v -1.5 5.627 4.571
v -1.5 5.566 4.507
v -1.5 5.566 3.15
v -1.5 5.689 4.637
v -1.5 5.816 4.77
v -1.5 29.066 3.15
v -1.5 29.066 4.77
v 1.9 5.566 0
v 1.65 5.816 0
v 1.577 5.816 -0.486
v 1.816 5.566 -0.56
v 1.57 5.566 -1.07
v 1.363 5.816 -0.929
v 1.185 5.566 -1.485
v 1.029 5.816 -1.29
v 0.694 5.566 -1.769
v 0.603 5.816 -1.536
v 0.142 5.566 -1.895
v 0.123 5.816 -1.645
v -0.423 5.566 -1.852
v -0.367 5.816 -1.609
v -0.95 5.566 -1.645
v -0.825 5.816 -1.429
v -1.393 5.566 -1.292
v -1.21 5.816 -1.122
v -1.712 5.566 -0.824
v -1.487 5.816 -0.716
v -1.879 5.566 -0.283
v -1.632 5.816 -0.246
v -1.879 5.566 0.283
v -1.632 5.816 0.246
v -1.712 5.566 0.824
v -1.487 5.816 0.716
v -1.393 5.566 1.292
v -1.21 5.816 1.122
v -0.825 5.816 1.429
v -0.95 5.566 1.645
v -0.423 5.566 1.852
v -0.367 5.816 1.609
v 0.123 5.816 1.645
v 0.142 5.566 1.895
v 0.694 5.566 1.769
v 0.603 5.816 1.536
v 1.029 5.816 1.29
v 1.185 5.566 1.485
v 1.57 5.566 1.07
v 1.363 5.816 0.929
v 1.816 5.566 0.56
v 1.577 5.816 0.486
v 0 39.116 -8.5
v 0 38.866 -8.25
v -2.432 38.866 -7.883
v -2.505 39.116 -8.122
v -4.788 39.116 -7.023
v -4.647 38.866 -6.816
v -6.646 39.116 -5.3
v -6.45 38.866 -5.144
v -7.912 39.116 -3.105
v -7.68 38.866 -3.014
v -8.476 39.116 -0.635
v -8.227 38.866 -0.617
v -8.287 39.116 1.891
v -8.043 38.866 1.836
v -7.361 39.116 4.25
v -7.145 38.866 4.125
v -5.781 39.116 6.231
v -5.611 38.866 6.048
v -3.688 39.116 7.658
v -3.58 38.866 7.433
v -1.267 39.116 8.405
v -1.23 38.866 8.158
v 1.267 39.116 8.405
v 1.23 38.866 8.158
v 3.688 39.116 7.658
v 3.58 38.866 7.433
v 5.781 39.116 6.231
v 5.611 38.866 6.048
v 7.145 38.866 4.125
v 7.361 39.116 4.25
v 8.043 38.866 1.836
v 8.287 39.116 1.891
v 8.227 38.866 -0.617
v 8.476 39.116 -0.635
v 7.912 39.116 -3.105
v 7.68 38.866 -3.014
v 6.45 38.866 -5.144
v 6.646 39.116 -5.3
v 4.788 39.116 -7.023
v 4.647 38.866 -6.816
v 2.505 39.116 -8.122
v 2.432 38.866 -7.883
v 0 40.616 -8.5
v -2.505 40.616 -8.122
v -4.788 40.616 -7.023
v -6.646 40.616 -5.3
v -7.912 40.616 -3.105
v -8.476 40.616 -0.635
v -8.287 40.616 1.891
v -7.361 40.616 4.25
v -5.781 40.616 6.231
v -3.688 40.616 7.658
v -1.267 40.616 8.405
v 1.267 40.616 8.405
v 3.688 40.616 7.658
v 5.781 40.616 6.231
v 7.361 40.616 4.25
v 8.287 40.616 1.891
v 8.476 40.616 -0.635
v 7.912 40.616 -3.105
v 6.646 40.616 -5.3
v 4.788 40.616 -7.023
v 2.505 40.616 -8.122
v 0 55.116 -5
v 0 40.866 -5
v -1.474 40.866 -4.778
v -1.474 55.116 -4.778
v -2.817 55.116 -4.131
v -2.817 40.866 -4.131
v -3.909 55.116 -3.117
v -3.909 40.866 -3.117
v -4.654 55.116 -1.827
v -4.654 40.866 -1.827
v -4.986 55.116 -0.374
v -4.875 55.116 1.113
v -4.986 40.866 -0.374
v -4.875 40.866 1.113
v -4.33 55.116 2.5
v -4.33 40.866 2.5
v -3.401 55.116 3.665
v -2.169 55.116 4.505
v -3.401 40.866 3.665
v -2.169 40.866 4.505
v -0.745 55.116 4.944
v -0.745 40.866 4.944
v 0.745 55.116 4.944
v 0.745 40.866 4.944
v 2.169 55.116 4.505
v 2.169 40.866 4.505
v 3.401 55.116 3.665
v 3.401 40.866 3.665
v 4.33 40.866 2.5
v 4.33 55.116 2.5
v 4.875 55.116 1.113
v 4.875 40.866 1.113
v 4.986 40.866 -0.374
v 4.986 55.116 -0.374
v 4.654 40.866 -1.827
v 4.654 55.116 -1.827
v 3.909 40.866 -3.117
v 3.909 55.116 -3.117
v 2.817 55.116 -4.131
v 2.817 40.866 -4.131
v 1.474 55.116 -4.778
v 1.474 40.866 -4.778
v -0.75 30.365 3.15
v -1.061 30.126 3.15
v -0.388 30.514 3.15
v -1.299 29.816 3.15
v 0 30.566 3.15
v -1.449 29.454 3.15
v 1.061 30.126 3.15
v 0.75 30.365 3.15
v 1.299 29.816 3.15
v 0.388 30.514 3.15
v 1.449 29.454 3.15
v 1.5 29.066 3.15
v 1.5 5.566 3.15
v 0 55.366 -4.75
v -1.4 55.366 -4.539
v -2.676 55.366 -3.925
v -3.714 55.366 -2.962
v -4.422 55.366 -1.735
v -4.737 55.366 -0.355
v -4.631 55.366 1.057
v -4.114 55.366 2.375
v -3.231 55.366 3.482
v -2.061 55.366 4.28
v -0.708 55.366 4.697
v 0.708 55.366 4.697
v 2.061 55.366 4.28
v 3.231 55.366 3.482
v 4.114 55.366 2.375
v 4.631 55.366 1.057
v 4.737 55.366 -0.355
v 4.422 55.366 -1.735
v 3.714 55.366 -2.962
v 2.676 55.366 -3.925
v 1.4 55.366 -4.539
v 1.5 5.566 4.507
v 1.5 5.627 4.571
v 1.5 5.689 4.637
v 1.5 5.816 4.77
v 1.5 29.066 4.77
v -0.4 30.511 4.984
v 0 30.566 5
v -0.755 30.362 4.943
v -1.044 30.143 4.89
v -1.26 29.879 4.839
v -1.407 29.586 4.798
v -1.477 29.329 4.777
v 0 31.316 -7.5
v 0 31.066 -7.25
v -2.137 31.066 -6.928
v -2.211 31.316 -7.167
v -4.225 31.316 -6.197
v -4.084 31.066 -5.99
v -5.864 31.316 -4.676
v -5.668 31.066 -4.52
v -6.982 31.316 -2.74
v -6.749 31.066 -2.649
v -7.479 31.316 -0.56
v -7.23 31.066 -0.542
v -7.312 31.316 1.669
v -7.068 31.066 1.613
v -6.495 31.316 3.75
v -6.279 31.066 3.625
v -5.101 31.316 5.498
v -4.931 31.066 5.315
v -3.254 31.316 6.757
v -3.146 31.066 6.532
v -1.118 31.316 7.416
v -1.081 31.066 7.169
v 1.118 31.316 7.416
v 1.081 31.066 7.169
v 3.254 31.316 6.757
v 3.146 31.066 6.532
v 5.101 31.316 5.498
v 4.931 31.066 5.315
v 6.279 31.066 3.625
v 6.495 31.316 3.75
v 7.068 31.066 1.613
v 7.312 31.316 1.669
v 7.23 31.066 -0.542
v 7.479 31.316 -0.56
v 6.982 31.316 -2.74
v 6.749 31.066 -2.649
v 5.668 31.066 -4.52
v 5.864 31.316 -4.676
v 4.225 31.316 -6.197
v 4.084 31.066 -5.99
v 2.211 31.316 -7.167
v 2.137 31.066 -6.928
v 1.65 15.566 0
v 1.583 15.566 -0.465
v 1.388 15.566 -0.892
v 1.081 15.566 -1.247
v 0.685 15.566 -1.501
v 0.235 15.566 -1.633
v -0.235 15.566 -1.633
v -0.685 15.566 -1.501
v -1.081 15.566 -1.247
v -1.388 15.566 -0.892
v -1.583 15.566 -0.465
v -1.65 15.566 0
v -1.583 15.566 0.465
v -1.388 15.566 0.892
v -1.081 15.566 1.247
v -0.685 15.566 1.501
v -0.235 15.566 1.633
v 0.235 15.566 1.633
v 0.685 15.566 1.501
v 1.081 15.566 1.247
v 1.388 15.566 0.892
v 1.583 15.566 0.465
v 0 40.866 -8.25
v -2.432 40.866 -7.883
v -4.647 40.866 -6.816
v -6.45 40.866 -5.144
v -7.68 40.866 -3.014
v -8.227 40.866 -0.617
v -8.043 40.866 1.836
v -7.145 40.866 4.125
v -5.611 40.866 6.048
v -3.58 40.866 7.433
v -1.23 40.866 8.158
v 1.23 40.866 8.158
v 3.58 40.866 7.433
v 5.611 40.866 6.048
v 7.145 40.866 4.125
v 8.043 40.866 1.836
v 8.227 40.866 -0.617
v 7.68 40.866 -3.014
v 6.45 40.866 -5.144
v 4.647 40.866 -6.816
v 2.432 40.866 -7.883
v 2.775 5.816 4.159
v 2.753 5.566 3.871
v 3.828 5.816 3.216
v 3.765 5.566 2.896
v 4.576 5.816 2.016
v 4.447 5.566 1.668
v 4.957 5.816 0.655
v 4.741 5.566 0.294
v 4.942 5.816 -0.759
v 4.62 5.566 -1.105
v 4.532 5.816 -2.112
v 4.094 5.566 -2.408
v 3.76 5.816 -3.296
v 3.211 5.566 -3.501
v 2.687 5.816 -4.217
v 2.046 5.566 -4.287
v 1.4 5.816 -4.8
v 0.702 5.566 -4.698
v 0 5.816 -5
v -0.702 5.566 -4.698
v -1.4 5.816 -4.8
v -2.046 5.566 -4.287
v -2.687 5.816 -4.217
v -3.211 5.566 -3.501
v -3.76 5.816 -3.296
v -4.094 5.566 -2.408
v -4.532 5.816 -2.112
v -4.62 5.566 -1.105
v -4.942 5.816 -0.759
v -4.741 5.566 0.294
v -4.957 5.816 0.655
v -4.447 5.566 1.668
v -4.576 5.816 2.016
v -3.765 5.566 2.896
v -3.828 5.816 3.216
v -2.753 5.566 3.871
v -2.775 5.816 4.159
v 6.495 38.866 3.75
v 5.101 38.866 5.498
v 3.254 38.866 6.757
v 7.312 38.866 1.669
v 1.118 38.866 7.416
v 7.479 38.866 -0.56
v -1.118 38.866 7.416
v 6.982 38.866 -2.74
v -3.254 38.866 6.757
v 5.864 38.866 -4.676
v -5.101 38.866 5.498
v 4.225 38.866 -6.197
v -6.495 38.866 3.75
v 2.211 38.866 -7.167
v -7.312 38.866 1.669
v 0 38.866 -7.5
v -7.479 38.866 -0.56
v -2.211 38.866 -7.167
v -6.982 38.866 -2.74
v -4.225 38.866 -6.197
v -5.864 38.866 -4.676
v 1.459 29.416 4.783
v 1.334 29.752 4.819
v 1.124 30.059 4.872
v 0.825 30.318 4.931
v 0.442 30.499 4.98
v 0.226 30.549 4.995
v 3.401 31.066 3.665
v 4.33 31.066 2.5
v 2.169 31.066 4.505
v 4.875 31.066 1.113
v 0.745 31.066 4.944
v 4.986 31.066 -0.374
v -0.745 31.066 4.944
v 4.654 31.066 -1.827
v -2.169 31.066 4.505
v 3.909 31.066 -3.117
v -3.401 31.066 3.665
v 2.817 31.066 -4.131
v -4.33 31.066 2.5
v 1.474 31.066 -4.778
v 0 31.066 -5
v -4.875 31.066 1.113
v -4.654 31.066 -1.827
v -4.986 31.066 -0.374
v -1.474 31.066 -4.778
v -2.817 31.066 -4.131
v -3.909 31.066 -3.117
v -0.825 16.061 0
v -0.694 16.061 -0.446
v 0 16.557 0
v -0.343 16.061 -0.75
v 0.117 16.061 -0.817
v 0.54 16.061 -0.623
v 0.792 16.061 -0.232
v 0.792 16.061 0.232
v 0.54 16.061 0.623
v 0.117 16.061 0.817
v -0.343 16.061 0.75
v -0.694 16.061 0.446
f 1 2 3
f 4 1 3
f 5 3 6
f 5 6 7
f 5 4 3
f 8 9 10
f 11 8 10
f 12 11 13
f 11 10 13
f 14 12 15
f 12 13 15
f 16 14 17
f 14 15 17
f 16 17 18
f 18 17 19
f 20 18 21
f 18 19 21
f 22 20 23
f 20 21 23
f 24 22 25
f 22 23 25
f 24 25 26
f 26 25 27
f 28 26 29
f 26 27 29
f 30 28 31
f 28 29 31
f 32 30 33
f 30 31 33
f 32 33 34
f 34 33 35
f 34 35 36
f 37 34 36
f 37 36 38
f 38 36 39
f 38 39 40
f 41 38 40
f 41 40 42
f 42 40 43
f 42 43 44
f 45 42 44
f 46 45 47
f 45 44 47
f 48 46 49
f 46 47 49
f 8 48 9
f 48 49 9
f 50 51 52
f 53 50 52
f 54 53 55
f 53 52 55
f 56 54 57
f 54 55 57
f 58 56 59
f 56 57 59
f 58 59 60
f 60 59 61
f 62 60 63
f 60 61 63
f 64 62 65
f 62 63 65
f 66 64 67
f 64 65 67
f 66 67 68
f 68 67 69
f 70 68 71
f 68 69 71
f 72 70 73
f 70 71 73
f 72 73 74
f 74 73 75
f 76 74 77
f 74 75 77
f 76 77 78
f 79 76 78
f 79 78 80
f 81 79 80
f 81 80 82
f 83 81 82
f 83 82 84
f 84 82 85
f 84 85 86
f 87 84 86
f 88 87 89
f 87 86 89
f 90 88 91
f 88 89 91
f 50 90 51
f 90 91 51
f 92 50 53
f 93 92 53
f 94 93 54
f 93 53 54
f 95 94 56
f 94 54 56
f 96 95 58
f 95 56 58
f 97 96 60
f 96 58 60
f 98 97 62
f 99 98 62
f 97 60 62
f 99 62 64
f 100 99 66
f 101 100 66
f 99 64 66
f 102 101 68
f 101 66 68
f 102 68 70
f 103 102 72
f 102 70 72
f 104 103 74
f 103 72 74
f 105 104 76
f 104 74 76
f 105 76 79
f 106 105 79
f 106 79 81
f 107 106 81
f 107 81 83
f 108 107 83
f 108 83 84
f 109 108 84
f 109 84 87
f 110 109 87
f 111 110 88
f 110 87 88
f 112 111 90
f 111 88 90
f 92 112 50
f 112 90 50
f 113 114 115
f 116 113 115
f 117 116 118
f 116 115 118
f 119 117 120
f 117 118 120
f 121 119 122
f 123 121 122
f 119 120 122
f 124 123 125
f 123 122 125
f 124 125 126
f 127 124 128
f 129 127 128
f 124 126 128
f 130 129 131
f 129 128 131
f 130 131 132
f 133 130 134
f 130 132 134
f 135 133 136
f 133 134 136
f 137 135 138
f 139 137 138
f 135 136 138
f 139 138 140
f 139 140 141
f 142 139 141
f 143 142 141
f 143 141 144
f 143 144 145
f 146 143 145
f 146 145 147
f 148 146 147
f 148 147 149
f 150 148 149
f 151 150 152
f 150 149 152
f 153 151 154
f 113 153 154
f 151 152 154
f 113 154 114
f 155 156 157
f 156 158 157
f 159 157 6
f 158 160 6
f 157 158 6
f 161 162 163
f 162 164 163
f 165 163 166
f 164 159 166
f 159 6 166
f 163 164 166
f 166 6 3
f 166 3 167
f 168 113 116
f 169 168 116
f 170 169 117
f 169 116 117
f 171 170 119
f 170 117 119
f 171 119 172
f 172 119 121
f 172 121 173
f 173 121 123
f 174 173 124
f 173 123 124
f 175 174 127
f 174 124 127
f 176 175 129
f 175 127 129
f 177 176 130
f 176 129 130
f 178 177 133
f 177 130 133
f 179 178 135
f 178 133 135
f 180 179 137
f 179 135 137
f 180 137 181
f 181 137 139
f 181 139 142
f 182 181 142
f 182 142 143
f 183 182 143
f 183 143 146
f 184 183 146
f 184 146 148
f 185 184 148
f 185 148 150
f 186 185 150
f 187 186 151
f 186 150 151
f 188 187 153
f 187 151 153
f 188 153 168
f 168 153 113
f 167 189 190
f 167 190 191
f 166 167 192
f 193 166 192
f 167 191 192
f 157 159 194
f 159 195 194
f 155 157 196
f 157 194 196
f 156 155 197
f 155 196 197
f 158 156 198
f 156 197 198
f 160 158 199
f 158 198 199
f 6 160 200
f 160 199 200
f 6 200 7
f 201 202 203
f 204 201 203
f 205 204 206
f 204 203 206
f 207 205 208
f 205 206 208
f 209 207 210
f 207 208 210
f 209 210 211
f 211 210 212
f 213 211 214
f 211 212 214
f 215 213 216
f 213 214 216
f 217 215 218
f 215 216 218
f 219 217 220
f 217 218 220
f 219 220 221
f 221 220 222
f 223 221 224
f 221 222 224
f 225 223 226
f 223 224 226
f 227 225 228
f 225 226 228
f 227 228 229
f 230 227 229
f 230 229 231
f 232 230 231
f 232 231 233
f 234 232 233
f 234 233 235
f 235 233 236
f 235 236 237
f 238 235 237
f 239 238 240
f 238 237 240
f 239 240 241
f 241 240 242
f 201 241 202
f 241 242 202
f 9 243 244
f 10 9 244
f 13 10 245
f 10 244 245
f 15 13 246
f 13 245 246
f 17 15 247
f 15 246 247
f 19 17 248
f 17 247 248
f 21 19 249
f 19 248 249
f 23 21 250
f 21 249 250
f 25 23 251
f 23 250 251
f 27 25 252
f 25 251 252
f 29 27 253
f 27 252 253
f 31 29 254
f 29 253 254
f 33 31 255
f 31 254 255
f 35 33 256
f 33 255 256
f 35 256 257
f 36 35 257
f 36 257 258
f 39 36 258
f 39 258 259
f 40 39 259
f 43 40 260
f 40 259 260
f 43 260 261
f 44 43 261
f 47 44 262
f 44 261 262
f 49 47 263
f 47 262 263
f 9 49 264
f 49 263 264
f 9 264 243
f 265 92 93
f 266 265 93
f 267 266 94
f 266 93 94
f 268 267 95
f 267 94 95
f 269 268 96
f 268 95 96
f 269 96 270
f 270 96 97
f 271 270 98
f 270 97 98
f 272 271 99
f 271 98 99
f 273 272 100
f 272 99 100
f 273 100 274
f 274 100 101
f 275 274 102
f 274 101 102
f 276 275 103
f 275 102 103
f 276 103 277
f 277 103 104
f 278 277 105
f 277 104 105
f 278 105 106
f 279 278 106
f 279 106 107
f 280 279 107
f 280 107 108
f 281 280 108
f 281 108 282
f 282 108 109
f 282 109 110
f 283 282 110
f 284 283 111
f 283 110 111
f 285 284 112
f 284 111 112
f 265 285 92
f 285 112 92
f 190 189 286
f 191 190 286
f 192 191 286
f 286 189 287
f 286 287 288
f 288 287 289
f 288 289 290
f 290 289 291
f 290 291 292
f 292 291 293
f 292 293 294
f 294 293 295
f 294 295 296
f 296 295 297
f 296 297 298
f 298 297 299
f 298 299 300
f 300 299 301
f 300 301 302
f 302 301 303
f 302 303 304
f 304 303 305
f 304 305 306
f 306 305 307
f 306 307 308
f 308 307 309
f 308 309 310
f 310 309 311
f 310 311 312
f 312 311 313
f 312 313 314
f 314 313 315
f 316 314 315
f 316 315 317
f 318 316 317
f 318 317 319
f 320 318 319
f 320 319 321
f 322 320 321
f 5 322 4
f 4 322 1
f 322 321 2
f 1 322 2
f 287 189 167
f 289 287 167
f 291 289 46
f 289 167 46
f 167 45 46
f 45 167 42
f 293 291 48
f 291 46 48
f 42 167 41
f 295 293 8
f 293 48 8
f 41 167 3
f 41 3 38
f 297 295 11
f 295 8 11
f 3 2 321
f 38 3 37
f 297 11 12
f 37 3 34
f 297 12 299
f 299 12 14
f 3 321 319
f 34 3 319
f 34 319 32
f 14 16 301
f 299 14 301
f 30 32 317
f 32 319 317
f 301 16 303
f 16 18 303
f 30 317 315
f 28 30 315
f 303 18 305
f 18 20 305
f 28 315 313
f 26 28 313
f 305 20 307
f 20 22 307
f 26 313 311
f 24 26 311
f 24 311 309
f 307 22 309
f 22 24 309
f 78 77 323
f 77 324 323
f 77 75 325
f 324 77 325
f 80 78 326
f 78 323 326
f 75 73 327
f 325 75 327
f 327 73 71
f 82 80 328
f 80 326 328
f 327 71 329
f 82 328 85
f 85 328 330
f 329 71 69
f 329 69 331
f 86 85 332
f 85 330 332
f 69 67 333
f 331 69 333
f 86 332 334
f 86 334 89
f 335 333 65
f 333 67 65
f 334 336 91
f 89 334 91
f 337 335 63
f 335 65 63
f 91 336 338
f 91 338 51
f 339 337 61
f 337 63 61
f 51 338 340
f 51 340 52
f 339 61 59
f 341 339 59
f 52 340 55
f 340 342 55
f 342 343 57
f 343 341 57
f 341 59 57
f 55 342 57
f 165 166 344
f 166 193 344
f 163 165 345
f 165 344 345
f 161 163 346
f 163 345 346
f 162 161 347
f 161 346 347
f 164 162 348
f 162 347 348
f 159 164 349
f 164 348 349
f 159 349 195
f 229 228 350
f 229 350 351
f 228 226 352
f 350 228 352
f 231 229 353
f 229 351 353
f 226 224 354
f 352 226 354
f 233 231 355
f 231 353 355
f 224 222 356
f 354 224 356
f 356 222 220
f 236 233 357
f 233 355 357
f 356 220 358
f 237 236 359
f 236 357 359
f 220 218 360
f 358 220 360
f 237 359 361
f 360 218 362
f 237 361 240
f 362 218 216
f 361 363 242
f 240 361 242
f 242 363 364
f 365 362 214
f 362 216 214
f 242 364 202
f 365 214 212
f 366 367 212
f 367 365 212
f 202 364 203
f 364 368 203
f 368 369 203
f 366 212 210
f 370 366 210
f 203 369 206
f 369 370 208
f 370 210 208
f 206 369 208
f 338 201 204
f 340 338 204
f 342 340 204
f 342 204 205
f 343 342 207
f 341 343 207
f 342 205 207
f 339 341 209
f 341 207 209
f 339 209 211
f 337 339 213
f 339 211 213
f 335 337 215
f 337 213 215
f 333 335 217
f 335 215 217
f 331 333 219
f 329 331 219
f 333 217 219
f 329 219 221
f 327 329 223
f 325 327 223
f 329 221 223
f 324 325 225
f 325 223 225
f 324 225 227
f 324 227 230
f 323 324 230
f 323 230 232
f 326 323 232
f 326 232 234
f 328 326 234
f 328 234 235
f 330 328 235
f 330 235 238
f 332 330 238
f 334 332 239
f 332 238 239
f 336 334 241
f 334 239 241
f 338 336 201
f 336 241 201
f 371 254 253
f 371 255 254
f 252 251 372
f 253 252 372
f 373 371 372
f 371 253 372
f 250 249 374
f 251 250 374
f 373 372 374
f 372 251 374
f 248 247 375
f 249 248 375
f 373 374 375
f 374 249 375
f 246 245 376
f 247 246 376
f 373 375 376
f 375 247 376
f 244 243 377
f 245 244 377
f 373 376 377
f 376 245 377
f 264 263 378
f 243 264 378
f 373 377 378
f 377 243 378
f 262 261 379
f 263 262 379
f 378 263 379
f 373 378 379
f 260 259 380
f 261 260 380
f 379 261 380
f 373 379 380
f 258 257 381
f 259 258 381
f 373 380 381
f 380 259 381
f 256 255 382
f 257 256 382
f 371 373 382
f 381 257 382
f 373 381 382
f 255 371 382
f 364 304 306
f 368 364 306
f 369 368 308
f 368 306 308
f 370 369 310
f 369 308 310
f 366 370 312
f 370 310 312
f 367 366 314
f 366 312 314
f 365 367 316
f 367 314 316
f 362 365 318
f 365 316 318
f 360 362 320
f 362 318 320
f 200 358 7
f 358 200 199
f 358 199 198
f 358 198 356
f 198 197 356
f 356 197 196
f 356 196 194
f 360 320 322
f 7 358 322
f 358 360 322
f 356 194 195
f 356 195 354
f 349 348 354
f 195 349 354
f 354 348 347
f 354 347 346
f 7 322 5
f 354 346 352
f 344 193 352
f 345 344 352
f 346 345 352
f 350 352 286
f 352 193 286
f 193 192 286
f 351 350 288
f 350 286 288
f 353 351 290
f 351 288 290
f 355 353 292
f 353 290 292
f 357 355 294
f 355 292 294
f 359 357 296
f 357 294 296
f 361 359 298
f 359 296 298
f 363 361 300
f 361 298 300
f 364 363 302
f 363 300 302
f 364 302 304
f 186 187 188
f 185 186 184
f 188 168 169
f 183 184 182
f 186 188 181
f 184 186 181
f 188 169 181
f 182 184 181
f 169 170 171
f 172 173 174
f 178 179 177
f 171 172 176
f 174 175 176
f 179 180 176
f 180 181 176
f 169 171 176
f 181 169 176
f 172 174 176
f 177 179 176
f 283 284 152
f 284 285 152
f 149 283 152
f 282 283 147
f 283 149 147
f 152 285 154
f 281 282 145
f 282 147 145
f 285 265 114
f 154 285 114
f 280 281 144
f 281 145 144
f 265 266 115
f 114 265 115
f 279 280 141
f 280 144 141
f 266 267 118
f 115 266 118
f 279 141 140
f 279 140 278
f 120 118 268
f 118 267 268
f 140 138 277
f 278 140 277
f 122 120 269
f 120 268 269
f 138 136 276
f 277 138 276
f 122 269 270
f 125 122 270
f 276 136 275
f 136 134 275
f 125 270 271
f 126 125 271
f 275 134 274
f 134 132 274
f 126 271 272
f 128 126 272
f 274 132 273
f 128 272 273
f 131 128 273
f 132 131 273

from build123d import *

# Parameters (mm, degrees)
TAP_DRILL_FOR_M4_TAP1_D     = 3.3
TAP_DRILL_FOR_M4_TAP1_DEPTH = 10
TAP_DRILL_FOR_M4_TAP1_TIP   = 0.991420021
CHAMFER1_SIZE               = 0.25
SKETCH4_W                   = 3
SKETCH4_H                   = 3
CUT_EXTRUDE1_DEPTH          = 25
FILLET1_R                   = 1.5


with BuildPart() as part:
    # Sketch1 → Revolve1 (revolve)
    with BuildSketch(Plane.XY, mode=Mode.PRIVATE) as revolve1_sk:
        Polygon((0, 55.365578046), (5, 55.365578046), (5, 40.865578046), (8.5, 40.865578046), (8.5, 38.865578046), (7.5, 38.865578046), (7.5, 31.065578046), (5, 31.065578046), (5, 5.565578046), (0, 5.565578046), align=None)
    revolve(revolve1_sk.sketch.rotate(Axis((0, 0, 0), (0, 1, 0)), 90), axis=Axis((0, 0, 0), (0, 1, 0)))

    # Tap Drill for M4 Tap1
    with Locations(Plane(origin=(0, 5.565578046, 0), x_dir=(-1, 0, 0), z_dir=(0, -1, 0))):
        with Locations((0, 0)):
            Hole(TAP_DRILL_FOR_M4_TAP1_D / 2, depth=TAP_DRILL_FOR_M4_TAP1_DEPTH)
            with Locations((0, 0, -(TAP_DRILL_FOR_M4_TAP1_DEPTH + TAP_DRILL_FOR_M4_TAP1_TIP / 2))):  # 118° drill point
                Cone(0, TAP_DRILL_FOR_M4_TAP1_D / 2, TAP_DRILL_FOR_M4_TAP1_TIP, mode=Mode.SUBTRACT)

    # Chamfer1
    chamfer1_edges = [part.edges().sort_by_distance(p)[0] for p in [
        (0, 55.365578046, 5),
        (-1.65, 5.565578046, 0),
        (0, 5.565578046, 5),
        (0, 31.065578046, 7.5),
        (0, 38.865578046, 8.5),
        (0, 40.865578046, 8.5),
    ]]
    chamfer(chamfer1_edges, length=CHAMFER1_SIZE)

    # Sketch4 → Cut-Extrude1 (cut)
    with BuildSketch(Plane.XZ.offset(-5.565578046)):
        with Locations((0, 4.65)):
            Rectangle(SKETCH4_W, SKETCH4_H)
    extrude(amount=-CUT_EXTRUDE1_DEPTH, mode=Mode.SUBTRACT)

    # Fillet1
    fillet1_edges = [part.edges().sort_by_distance(p)[0] for p in [
        (1.5, 30.565578046, 3.959848004),
        (-1.5, 30.565578046, 3.959848004),
    ]]
    fillet(fillet1_edges, radius=FILLET1_R - 0.0001)  # a hair under: the kernel refuses the full size


solid = part.part
